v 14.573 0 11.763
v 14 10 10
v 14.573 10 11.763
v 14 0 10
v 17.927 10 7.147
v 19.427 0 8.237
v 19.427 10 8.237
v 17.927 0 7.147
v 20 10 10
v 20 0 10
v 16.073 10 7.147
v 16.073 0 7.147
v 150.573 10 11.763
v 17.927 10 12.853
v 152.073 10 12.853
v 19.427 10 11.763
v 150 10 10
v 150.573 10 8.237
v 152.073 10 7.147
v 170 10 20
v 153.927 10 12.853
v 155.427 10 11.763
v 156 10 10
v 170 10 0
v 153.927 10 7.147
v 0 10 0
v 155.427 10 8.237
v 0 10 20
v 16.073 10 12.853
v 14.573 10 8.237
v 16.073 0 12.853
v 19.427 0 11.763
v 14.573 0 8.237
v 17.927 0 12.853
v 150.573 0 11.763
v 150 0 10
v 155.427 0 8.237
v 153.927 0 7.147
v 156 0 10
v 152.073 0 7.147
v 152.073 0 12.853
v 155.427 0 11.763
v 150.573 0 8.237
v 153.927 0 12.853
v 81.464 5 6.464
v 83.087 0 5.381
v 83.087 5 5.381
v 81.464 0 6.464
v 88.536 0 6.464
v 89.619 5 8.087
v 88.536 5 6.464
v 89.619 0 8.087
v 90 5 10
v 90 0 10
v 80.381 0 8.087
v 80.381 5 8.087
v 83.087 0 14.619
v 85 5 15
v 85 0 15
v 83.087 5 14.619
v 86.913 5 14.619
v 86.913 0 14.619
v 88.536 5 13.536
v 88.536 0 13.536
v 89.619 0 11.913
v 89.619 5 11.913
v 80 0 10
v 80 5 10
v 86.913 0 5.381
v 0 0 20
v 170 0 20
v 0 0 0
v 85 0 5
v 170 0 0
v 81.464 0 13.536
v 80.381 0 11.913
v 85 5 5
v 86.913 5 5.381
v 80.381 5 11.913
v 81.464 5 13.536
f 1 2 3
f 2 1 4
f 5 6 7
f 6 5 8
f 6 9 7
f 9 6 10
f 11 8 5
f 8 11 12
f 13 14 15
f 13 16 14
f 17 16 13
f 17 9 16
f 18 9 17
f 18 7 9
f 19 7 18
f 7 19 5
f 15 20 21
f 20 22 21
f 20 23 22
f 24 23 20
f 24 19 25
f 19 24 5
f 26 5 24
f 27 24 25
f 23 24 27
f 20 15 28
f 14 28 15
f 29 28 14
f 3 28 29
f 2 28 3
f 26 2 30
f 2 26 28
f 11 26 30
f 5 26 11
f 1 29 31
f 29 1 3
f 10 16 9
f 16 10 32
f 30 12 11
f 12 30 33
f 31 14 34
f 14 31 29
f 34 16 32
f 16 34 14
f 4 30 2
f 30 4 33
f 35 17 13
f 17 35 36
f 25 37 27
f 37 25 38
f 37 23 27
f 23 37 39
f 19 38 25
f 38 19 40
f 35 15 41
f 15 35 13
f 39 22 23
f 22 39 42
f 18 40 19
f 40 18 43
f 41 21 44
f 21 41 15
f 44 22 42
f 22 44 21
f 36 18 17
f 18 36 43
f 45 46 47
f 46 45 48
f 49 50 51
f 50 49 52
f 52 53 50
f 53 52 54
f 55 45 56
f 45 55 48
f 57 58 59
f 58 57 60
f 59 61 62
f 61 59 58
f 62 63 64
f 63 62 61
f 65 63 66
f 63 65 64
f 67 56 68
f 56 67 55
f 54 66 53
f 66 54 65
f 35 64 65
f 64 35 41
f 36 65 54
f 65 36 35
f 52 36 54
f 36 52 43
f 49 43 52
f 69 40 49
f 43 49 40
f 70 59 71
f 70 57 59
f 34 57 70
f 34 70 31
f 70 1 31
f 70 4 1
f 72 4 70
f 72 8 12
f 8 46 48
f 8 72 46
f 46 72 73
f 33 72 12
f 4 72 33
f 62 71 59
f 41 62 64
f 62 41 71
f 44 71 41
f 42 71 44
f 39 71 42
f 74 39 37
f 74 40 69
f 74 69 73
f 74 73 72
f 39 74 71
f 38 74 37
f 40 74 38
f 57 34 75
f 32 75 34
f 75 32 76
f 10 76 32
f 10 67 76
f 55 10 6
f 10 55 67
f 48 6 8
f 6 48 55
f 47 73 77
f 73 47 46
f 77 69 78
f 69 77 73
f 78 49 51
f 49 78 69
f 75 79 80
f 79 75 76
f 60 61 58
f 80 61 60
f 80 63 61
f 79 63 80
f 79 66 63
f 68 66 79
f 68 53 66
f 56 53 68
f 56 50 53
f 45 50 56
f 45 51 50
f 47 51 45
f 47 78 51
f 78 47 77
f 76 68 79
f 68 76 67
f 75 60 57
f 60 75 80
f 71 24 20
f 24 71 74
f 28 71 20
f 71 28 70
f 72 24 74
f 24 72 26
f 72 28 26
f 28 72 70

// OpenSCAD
// file: slab.scad
include <defs.scad>

module make_slab()
{
    cube([slab_l, slab_thickness, depth]);
}

module make_linear_hole()
{
    rotate([-90,0,0]) cylinder(slab_thickness,linear_bearing_outside_r,linear_bearing_outside_r);
    // infinite hole
    rotate([-90,0,180]) cylinder(forever,linear_bearing_outside_r,linear_bearing_outside_r);
}
module make_bearing_insert()
{
    rotate([-90,0,0]) cylinder(bearing_depth,bearing_outside_r,bearing_outside_r);
    // infinite hole
    rotate([-90,0,180]) cylinder(forever,bearing_inside_r+0.2,bearing_inside_r+0.2);
}


module make_slab_holes()
{
    translate([linear_rod_offset,0,depth/2])
    {
        if ($children > 0) children(0);
    }
    translate([slab_l - linear_rod_offset,0,depth/2])
    {
        if ($children > 2) children(2);
    }
    translate([slab_l/2,0,depth/2])
    {
        if ($children > 1) children(1);
    }
}

difference()
{
    make_slab();
    make_slab_holes()
    {
        make_linear_hole();
        make_bearing_insert();
        make_linear_hole();
    }
}
// file: defs.scad
forever = 1000;
model_threads = 0;
apply_mold = 1;

inside_width = 130;
short_wall_thickness = 20;
tall_wall_thickness = 20;
outside_width = inside_width + short_wall_thickness*2;
depth = 20;
slab_shortener = 4;
slab_wall = depth/2;
slab_protrusion = 1.25;
hole_rad = 2;
ptol = .5;

short_wall_l = outside_width;
tall_wall_l = outside_width;

slab_thickness = depth/2;
slab_l = short_wall_l;
slab_thickness = depth/2;
linear_rod_offset = slab_l/10;
linear_bearing_outside_r = 3;
linear_bearing_inside_r = 1.5;
bearing_outside_r = 5;
bearing_inside_r = 2.5;
bearing_depth = 5;

slabx_o = 20;
slaby_o = 15;
// main file
include <defs.scad>
include <slab.scad>


module to_slab_positions_y(slab_offset = slaby_o)
{
    // close short slab
    translate([tall_wall_thickness + ptol/2,
            short_wall_thickness + ptol + slab_offset,
            0]) children();

    // far short slab
    translate([tall_wall_thickness + ptol/2, 
            tall_wall_l - (short_wall_thickness+slab_thickness)  - slab_offset,
            0])
        translate([slab_l,slab_thickness,0]) rotate([0,0,180]) children();
}
module to_slab_positions_x(slab_offset = slabx_o)
{
    // right top slab
    translate([ tall_wall_thickness + short_wall_l - slab_thickness - slab_offset,0,depth + ptol])
        translate([slab_thickness,0,0]) rotate([0,0,90]) children();

    // right bottom slab
    translate([tall_wall_thickness + short_wall_l - slab_thickness - slab_offset,0,-depth - ptol])
        translate([slab_thickness,0,0]) rotate([0,0,90]) children();

    // left top slab
    translate([tall_wall_thickness + ptol + slab_offset,0, depth + ptol])
        translate([0,slab_l,0]) rotate([0,0,-90]) children();

    // left bottom slab
    translate([tall_wall_thickness + ptol + slab_offset,0, -depth - ptol])
        translate([0,slab_l,0]) rotate([0,0,-90]) children();
}
module to_slab_positions(slab_offsetx = slabx_o, slab_offsety = slaby_o)
{
    to_slab_positions_x(slab_offsetx) children();
    to_slab_positions_y(slab_offsety) children();
}

module short_wall_origin()
{
    translate([tall_wall_thickness+ptol/2,0,0])
    {
        children();
    }
}


module tall_wall_origin()
{
    translate([0,0,-depth])
    {
        children();
    }
}


module Solids()
{
    short_wall_origin()
    {
        ShortWall();
        translate([0, inside_width + short_wall_thickness + ptol]) ShortWall();
    }

    tall_wall_origin()
    {
        TallWall();
        translate([tall_wall_thickness + outside_width + ptol,0,0])
        {
            TallWall();
        }
    }

    to_slab_positions()
    {
        color("green") make_slab();
    }

}

module Holes()
{
    to_slab_positions()
    {
        make_slab_holes()
        {
            make_linear_hole();
            make_bearing_insert();
            make_linear_hole();
        }
    }
}
